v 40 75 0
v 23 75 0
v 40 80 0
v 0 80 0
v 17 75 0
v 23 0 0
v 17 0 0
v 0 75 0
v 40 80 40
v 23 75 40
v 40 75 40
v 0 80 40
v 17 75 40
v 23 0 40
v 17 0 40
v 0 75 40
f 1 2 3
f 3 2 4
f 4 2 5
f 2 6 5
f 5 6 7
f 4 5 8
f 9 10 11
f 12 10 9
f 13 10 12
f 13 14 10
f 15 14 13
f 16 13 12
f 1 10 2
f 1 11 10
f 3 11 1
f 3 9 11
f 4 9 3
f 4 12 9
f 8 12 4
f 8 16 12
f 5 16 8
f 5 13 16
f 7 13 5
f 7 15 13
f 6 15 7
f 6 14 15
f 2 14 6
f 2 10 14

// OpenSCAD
$fn = 32;

// ----------------------------------------------------------------------
// Structural section: tee 40 x 80 mm
// ----------------------------------------------------------------------

// --- parameters (mm) ---
sec_w = 40;               // tee width, X
sec_h = 80;               // tee height, Y
flange_t = 5;             // top flange thickness
web_t = 6;                // web thickness
plate_t = 40;             // cut length, Z (extrusion height)

profile = [[17, 0], [23, 0], [23, 75], [40, 75], [40, 80], [0, 80], [0, 75], [17, 75]];  // primary outline, 8 points, counter clockwise

// --- the one profile operation ---
linear_extrude(height = plate_t) polygon(points = profile);
